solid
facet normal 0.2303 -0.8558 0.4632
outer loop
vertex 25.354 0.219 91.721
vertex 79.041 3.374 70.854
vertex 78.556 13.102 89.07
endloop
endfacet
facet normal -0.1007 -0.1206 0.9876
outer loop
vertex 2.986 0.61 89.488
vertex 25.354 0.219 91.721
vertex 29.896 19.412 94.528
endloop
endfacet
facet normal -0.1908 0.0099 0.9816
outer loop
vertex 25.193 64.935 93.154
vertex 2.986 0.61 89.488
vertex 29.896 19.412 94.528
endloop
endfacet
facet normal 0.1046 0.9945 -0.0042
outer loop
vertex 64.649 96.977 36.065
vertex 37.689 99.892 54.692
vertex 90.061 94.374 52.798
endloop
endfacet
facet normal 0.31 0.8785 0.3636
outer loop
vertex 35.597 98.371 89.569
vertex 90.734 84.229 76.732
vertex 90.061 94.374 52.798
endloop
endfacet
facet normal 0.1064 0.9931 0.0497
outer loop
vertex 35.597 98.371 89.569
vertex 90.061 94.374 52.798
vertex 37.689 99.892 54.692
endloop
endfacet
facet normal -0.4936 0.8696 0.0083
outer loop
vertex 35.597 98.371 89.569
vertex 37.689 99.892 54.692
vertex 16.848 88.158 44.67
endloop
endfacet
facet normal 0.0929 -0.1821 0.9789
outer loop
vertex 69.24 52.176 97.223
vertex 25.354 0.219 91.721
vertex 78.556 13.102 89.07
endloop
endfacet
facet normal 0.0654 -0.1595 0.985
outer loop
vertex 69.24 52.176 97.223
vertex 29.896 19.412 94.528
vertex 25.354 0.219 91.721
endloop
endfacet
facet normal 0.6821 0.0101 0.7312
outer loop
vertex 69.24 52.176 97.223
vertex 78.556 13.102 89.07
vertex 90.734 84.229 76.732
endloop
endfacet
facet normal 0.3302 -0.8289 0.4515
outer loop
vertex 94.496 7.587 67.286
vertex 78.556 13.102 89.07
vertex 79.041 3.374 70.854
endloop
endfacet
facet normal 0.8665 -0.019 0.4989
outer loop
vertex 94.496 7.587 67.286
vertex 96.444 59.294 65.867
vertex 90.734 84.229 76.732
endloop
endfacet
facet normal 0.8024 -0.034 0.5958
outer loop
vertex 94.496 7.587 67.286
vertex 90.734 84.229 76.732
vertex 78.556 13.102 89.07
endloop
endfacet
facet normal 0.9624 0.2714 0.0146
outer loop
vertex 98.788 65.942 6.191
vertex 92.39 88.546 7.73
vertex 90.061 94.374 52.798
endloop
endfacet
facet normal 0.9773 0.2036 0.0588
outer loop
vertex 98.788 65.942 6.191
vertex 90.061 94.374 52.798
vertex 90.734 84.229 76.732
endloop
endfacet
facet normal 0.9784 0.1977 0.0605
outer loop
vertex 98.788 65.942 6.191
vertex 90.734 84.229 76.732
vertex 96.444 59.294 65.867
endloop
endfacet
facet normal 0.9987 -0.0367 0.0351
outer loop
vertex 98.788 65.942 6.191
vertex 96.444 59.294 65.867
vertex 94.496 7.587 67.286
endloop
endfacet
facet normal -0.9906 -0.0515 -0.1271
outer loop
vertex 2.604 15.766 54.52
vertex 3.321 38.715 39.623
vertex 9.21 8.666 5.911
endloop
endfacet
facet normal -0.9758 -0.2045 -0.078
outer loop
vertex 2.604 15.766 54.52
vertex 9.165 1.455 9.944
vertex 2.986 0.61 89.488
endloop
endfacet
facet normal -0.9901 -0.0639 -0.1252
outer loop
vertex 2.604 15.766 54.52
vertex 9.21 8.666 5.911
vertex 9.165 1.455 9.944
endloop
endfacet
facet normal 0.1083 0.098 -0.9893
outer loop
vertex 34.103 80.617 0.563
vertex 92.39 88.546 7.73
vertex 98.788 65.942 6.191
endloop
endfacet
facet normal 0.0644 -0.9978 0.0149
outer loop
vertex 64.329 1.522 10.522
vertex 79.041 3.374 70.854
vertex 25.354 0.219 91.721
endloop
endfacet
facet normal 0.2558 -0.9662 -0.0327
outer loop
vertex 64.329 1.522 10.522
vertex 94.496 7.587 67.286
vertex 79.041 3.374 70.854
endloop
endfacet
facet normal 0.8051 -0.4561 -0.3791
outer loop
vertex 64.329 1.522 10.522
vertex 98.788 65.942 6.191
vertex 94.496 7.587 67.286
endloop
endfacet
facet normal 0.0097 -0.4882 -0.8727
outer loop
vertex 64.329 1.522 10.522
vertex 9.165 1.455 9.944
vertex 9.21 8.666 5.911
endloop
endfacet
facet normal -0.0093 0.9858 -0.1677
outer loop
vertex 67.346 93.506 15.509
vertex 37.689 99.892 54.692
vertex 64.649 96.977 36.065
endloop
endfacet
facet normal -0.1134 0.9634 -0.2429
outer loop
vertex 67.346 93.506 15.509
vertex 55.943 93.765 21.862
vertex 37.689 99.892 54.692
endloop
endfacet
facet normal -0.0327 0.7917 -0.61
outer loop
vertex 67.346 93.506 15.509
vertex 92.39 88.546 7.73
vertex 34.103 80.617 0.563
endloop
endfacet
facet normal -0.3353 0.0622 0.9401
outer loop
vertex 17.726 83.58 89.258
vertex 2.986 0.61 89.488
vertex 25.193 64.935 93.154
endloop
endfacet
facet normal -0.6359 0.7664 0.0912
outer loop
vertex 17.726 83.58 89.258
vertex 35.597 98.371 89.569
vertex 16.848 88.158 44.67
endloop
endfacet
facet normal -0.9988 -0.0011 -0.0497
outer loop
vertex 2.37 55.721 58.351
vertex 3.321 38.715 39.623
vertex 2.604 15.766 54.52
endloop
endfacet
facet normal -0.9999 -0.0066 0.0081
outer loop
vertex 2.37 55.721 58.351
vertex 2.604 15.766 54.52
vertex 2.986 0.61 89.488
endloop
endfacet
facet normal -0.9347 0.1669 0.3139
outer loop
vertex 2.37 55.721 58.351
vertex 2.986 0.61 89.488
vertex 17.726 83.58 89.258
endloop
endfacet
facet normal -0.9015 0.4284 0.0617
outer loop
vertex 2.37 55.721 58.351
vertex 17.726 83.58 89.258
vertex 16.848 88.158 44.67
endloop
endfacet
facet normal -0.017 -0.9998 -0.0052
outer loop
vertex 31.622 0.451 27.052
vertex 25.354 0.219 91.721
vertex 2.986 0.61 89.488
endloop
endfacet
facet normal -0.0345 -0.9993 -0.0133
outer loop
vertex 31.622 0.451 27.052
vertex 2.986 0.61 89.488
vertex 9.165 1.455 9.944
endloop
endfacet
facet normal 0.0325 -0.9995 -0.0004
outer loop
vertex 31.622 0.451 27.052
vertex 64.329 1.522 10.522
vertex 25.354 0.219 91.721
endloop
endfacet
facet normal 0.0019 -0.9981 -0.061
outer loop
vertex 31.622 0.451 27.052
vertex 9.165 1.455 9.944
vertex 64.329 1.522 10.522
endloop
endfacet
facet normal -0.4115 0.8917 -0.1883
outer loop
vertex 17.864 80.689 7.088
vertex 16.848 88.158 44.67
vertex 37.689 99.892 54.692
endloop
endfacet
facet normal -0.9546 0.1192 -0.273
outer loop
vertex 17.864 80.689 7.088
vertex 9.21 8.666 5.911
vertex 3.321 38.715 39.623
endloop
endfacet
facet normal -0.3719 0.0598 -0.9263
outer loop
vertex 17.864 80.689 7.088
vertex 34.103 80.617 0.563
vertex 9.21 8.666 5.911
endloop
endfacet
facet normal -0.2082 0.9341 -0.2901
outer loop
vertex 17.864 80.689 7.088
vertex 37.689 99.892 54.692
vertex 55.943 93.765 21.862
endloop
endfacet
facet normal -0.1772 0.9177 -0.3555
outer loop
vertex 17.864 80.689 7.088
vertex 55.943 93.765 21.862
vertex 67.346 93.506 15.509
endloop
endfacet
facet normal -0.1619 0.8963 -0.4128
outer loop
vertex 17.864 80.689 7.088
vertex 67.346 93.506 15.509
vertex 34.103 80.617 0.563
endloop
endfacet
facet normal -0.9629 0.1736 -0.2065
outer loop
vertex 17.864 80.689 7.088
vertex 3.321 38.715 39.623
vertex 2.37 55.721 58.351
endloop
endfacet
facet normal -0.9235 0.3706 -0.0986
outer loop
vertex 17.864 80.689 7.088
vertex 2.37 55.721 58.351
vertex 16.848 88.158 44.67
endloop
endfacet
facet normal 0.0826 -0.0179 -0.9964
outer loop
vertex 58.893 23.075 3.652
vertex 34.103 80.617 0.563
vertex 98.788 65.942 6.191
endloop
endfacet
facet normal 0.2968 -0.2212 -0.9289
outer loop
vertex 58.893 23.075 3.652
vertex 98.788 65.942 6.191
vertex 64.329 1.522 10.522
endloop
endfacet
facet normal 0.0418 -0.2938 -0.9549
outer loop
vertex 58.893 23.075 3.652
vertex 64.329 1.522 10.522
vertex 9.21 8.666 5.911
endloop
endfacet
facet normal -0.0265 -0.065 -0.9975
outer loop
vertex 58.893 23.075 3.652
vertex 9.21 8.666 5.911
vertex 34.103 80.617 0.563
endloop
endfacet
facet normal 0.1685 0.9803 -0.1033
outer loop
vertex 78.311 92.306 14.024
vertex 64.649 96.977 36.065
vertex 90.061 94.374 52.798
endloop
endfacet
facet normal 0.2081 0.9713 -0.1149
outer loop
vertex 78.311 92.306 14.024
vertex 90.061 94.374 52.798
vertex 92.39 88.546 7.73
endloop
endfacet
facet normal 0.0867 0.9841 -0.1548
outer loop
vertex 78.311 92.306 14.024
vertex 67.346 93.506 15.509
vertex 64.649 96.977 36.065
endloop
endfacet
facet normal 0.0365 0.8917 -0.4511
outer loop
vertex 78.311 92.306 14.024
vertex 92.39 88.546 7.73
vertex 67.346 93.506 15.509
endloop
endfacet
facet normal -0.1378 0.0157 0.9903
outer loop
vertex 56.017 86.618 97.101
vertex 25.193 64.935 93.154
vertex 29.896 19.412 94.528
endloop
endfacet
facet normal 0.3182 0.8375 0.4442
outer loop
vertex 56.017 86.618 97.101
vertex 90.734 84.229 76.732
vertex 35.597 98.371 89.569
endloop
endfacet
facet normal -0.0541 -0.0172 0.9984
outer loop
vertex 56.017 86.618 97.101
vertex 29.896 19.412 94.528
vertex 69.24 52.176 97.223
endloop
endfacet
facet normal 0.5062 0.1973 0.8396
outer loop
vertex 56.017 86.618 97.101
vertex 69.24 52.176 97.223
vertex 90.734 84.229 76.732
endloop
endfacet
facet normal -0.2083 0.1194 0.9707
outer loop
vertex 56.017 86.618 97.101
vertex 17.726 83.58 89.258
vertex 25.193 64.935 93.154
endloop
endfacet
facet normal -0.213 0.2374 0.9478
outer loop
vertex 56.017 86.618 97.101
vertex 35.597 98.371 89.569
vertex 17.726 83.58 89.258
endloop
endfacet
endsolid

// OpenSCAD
function _slice(list,start,end=undef) =
    let(end = end==undef?len(list):end)
    [for(i=[start:1:end-1]) list[i]];
        
function _delete(list,pos) =
    let(l=len(list))
    pos == 0 ? [for(i=[1:1:l-1]) list[i]] :
    pos >= l-1 ? [for(i=[0:1:pos-1]) list[i]] :
    concat([for(i=[0:1:pos-1]) list[i]],
        [for(i=[pos+1:1:l-1]) list[i]]);

function _areCollinear(a,b,c) = cross(b-a,c-a) == [0,0,0];
        
function _areCoplanar(a,b,c,d) = (d-a)*cross(b-a,c-a) == 0;
    
function _findNoncollinear(list,point1,point2,pos=0) = 
    pos >= len(list) ? undef :
    ! _areCollinear(point1,point2,list[pos]) ? pos :
    _findNoncollinear(list,point1,point2,pos=pos+1);
        
function _findNoncoplanar(list,point1,point2,point3,pos=0) =
   pos >= len(list) ? undef :
   ! _areCoplanar(point1,point2,point3,list[pos]) ? pos : 
        _findNoncoplanar(list,point1,point2,point3,pos=pos+1);
        
function _isBoundedBy(a,face,strict=false) =
    cross(face[1]-face[0],face[2]-face[0])*(a-face[0]);
        
function _makeTet(a,b,c,d) =
    _isBoundedBy(d,[a,b,c]) >= 0 ? 
        [[a,b,c],[b,a,d],[c,b,d],[a,c,d]] :
        [[c,b,a],[d,a,b],[d,b,c],[d,c,a]];

function _findTri(list) = 
    let(l2=_unique(list))
    assert(len(list)>=3)
    let(a=list[0],
        b=list[1],
        l3=_slice(list,2),
        ci=_findNoncollinear(l3,a,b),        
        c=assert(ci != undef) l3[ci],
        l4=_delete(l3,ci))
        [[a,b,c],l4];
        
function _findTet(list) =    
    let(ft=_findTri(list),
        tri=ft[0],
        l4=ft[1],
        di=assert(len(l4)>0) _findNoncoplanar(l4,tri[0],tri[1],tri[2]),
        d=assert(di != undef) l4[di],
        l5=_delete(l4,di))
        [_makeTet(tri[0],tri[1],tri[2],d),l5];
    
function _find(list,value) =
    let(m=search([value],list,1)[0]) 
    m==[] ? undef : m;
           
function _unique(list,soFar=[],pos=0) =
    pos >= len(list) ? soFar :
    _find(soFar,list[pos]) == undef ? _unique(list,soFar=concat(soFar,[list[pos]]),pos=pos+1) :
    _unique(list,soFar=soFar,pos=pos+1);
    
function _makePointsAndFaces(triangles) =
    let(points=_unique([for(t=triangles) for(v=t) v]))
        [points, [for(t=triangles) [for(v=t) _find(points,v)]]];

function _sameSide(p1,p2, a,b) = 
    let(cp1 = cross(b-a, p1-a),
        cp2 = cross(b-a, p2-a)) 
        cp1*cp2 >= 0;

function _insideTriangle(p, t) = 
    _sameSide(p,t[0],t[1],t[2]) &&
    _sameSide(p,t[1],t[0],t[2]) &&
    _sameSide(p,t[2],t[0],t[1]);
            
            
function _satisfiesConstraint(p, triangle) =
    let(c=_isBoundedBy(p, triangle))
    c > 0 || (c == 0 && _insideTriangle(p, triangle));
    
            
function _insidePoly(p, triangles, pos=0) = 
    pos >= len(triangles) ? true :
    !_satisfiesConstraint(p, triangles[pos]) ? false :
    _insidePoly(p, triangles, pos=pos+1);
        
function _haveEdge(triangles, e, pos=0) =
    pos >= len(triangles) ? false :
    e==[triangles[pos][0],triangles[pos][1]] ||
        e==[triangles[pos][1],triangles[pos][2]] ||
        e==[triangles[pos][2],triangles[pos][0]] ? true :
        _haveEdge(triangles, e, pos=pos+1);
        
function _outerEdges(triangles) =
        [for(t=triangles) for(e=[[t[0],t[1]],
                [t[1],t[2]],
                [t[2],t[0]]])
            if ( !_haveEdge(triangles,[e[1],e[0]])) e];
                
function _unlit(triangles, p) = [for(t=triangles) if(_isBoundedBy(p, t) >= 0) t];
        
function _addToHull(h, p) = 
    let(unlit = _unlit(h,p),
        edges = _outerEdges(unlit))
        concat(unlit, [for(e=edges) [e[1],e[0],p]]);

function _expandHull(h, points, pos=0) =
    pos >= len(points) ? h :
    !_insidePoly(points[pos],h) ?  _expandHull(_addToHull(h,points[pos]),points,pos=pos+1) :
    _expandHull(h, points, pos=pos+1);
            
function pointHull3D(points) =
    let(ft=_findTet(points))
        _expandHull(ft[0], ft[1]);
        
function _findEdge(edges,point,pos=0) =
    pos >= len(edges) ? undef :
    edges[pos][0] == point ? pos :
    _findEdge(edges,point,pos=pos+1);
        
function _add1Edge(edgesAndSoFar) =
    let(edges=edgesAndSoFar[0],
        soFar=edgesAndSoFar[1],
        index=_findEdge(edges,soFar[len(soFar)-1]))
        assert(index!=undef)
        [_delete(edgesAndSoFar[0],index),concat(edgesAndSoFar[1],[edgesAndSoFar[0][index][1]])];
        
function _traceEdges(edgesAndSoFar) =
    len(edgesAndSoFar[0]) == 0 ? edgesAndSoFar[1] :
    _traceEdges(_add1Edge(edgesAndSoFar));
        
function pointHull2D(points) = 
    let(
        p3d = concat([[0,0,1]], [for(p=points) [p[0],p[1],0]]),
        h = pointHull3D(p3d),
        edges = [for(t=h) if(t[0][2]==1 || t[1][2]==1 || t[2][2]==1)
                t[0][2]==1 ? [t[1],t[2]] : 
                t[1][2]==1 ? [t[2],t[0]] :
                [t[0],t[1]]],
        trace = _traceEdges([edges,[edges[0][0]]])) [for(v=trace) [v[0],v[1]]];
        
module pointHull(points) {
    if (len(points[0])==2) {
        polygon(pointHull2D(points));
    }
    else {
        paf = _makePointsAndFaces(pointHull3D(points));
        polyhedron(points=paf[0],faces=paf[1]);
    }
}

//<skip>            
points = [for(i=[0:99]) rands(0,100,3)];
pointHull(points);
//</skip>
